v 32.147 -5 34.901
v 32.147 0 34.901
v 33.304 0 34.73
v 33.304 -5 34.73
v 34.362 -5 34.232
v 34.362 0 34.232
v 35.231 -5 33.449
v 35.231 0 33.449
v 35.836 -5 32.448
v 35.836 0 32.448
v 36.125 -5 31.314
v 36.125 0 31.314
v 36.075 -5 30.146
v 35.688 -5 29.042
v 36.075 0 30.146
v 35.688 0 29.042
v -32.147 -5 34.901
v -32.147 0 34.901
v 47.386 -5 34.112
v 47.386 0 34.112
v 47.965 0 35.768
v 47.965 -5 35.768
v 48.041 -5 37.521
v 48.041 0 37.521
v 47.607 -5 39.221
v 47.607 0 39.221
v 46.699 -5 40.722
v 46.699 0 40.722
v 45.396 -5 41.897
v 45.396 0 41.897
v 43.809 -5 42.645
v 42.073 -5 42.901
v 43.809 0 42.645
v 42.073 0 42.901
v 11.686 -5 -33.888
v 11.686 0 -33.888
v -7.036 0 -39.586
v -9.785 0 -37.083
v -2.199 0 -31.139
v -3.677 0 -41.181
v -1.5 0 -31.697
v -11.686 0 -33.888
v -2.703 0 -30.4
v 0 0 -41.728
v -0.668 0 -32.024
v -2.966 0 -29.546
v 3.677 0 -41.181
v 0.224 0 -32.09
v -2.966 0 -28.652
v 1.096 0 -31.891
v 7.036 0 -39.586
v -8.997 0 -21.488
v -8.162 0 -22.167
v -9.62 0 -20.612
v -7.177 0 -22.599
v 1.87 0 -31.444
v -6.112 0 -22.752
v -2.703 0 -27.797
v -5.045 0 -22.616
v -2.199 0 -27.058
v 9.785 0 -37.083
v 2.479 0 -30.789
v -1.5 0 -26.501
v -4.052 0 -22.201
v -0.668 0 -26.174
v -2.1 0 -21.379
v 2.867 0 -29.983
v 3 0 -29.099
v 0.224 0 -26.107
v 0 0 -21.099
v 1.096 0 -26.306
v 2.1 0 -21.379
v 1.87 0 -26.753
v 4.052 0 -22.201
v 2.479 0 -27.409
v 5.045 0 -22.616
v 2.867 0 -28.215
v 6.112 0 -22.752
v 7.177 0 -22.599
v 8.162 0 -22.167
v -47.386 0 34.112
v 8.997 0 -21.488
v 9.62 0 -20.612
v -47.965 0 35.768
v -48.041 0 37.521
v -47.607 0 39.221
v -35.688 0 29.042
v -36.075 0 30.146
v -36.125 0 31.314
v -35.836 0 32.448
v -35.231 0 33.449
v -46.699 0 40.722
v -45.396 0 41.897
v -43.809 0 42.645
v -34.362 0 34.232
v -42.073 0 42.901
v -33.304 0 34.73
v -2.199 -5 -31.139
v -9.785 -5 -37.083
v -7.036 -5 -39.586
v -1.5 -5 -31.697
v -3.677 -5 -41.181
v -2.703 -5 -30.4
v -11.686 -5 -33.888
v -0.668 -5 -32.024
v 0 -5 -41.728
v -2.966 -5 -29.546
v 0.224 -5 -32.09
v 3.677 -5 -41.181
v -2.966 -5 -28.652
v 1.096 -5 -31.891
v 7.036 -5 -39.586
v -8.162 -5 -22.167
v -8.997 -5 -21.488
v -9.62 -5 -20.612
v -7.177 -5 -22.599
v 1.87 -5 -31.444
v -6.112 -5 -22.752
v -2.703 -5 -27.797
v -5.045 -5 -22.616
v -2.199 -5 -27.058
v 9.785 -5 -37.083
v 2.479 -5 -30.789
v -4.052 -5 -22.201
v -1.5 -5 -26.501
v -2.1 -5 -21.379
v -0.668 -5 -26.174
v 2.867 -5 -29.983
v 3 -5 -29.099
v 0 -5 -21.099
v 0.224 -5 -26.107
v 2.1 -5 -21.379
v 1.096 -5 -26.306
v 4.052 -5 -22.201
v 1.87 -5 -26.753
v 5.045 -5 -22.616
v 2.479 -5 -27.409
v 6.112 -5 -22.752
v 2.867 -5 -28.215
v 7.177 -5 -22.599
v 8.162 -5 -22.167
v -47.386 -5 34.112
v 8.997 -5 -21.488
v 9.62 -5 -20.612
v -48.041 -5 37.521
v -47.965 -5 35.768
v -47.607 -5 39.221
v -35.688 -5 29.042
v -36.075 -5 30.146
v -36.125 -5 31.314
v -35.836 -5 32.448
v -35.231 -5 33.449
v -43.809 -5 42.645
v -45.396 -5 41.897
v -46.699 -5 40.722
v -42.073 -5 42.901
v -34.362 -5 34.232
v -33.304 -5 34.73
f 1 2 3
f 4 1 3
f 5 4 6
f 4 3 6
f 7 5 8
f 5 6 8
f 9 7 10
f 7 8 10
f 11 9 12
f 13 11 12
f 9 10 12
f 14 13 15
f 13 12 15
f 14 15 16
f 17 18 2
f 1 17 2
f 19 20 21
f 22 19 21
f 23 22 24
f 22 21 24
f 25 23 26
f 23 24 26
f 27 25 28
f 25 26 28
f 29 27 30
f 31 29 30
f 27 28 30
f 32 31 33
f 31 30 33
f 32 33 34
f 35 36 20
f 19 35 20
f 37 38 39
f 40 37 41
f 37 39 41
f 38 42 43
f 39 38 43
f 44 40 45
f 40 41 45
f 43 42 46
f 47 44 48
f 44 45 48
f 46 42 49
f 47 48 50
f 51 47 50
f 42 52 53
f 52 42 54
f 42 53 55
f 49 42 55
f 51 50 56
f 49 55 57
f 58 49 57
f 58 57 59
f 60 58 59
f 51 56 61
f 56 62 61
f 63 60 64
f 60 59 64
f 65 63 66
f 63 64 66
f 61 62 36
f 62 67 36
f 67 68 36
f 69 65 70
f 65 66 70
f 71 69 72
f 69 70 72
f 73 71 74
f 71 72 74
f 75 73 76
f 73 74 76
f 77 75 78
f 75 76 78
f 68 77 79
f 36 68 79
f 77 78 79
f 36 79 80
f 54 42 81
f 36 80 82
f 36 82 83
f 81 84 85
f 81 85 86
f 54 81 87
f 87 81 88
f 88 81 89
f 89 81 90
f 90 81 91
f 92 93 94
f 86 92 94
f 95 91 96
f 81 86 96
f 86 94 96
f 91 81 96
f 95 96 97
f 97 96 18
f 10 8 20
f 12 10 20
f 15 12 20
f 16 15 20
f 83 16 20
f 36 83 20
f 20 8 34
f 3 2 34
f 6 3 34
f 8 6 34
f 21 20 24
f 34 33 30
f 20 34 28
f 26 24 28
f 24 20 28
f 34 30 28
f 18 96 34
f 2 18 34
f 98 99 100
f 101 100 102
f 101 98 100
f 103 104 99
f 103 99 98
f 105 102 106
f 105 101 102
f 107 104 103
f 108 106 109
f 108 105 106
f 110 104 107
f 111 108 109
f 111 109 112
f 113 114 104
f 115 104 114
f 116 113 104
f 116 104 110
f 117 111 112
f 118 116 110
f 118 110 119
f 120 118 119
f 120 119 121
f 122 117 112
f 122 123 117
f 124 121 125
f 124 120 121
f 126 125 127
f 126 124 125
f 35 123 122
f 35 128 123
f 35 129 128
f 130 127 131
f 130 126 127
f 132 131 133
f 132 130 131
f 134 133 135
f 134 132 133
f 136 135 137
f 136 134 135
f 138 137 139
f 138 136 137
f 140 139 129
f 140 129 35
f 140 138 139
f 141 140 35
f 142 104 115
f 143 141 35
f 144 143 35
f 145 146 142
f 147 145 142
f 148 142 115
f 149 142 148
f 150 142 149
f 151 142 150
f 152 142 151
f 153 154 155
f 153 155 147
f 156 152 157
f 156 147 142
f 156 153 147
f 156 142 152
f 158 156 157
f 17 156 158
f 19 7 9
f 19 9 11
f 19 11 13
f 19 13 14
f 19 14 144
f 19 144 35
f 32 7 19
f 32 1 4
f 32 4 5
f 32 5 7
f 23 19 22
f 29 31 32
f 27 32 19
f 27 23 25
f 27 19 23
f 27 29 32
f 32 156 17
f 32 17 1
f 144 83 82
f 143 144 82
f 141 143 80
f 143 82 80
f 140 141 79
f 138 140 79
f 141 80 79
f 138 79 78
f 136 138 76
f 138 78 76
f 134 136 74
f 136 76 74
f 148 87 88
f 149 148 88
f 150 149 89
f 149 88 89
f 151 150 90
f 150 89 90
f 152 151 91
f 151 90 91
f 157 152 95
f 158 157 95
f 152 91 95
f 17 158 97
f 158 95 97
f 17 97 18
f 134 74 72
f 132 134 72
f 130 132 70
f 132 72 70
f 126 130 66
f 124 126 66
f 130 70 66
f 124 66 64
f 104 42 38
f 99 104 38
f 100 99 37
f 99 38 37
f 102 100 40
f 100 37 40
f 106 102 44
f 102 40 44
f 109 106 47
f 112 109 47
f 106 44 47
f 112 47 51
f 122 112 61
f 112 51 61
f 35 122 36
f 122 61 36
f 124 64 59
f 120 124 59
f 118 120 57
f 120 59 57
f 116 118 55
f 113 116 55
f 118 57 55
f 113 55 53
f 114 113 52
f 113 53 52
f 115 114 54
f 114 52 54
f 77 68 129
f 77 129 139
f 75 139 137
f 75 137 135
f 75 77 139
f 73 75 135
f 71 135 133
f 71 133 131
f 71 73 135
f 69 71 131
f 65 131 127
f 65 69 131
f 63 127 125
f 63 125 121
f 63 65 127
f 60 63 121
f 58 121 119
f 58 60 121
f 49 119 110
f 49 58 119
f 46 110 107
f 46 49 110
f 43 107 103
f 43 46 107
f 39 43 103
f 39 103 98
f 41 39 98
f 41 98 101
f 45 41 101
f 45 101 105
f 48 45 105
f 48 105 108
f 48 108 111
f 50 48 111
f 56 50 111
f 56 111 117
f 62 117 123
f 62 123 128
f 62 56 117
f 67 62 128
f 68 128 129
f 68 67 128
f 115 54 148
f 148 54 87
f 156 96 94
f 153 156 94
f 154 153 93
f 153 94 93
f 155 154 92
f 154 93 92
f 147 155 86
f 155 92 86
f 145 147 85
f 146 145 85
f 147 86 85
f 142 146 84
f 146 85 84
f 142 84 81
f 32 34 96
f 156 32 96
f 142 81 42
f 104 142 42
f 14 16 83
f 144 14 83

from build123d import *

# Parameters (mm, degrees)
F0_R     = 3
F1_DEPTH = 5


with BuildPart() as f1:
    # F0 (on Front) → F1 (new body)
    with BuildSketch(Plane.XZ):
        with BuildLine():
            Line((42.073386, 42.901178), (-42.073386, 42.901178))
            ThreePointArc((-42.073386, 42.901178), (-47.208268, 40.004884), (-47.385773, 34.112174))
            Line((-47.385773, 34.112174), (-11.685773, -33.887826))
            ThreePointArc((-11.685773, -33.887826), (0, -41.72783), (11.685773, -33.887826))
            Line((11.685773, -33.887826), (47.385773, 34.112174))
            ThreePointArc((47.385773, 34.112174), (47.208268, 40.004884), (42.073386, 42.901178))
        make_face()
        with Locations((0, -29.098822)):
            Circle(F0_R, mode=Mode.SUBTRACT)
        with BuildLine():
            Line((-9.620267, -20.611675), (-35.688363, 29.041842))
            ThreePointArc((-35.688363, 29.041842), (-35.570026, 32.970315), (-32.146772, 34.901178))
            Line((-32.146772, 34.901178), (32.146772, 34.901178))
            ThreePointArc((32.146772, 34.901178), (35.570026, 32.970315), (35.688363, 29.041842))
            Line((35.688363, 29.041842), (9.620267, -20.611675))
            ThreePointArc((9.620267, -20.611675), (7.176721, -22.598675), (4.05245, -22.201167))
            ThreePointArc((4.05245, -22.201167), (0, -21.098822), (-4.05245, -22.201167))
            ThreePointArc((-4.05245, -22.201167), (-7.176721, -22.598675), (-9.620267, -20.611675))
        make_face(mode=Mode.SUBTRACT)
    extrude(amount=F1_DEPTH)


solid = f1.part
